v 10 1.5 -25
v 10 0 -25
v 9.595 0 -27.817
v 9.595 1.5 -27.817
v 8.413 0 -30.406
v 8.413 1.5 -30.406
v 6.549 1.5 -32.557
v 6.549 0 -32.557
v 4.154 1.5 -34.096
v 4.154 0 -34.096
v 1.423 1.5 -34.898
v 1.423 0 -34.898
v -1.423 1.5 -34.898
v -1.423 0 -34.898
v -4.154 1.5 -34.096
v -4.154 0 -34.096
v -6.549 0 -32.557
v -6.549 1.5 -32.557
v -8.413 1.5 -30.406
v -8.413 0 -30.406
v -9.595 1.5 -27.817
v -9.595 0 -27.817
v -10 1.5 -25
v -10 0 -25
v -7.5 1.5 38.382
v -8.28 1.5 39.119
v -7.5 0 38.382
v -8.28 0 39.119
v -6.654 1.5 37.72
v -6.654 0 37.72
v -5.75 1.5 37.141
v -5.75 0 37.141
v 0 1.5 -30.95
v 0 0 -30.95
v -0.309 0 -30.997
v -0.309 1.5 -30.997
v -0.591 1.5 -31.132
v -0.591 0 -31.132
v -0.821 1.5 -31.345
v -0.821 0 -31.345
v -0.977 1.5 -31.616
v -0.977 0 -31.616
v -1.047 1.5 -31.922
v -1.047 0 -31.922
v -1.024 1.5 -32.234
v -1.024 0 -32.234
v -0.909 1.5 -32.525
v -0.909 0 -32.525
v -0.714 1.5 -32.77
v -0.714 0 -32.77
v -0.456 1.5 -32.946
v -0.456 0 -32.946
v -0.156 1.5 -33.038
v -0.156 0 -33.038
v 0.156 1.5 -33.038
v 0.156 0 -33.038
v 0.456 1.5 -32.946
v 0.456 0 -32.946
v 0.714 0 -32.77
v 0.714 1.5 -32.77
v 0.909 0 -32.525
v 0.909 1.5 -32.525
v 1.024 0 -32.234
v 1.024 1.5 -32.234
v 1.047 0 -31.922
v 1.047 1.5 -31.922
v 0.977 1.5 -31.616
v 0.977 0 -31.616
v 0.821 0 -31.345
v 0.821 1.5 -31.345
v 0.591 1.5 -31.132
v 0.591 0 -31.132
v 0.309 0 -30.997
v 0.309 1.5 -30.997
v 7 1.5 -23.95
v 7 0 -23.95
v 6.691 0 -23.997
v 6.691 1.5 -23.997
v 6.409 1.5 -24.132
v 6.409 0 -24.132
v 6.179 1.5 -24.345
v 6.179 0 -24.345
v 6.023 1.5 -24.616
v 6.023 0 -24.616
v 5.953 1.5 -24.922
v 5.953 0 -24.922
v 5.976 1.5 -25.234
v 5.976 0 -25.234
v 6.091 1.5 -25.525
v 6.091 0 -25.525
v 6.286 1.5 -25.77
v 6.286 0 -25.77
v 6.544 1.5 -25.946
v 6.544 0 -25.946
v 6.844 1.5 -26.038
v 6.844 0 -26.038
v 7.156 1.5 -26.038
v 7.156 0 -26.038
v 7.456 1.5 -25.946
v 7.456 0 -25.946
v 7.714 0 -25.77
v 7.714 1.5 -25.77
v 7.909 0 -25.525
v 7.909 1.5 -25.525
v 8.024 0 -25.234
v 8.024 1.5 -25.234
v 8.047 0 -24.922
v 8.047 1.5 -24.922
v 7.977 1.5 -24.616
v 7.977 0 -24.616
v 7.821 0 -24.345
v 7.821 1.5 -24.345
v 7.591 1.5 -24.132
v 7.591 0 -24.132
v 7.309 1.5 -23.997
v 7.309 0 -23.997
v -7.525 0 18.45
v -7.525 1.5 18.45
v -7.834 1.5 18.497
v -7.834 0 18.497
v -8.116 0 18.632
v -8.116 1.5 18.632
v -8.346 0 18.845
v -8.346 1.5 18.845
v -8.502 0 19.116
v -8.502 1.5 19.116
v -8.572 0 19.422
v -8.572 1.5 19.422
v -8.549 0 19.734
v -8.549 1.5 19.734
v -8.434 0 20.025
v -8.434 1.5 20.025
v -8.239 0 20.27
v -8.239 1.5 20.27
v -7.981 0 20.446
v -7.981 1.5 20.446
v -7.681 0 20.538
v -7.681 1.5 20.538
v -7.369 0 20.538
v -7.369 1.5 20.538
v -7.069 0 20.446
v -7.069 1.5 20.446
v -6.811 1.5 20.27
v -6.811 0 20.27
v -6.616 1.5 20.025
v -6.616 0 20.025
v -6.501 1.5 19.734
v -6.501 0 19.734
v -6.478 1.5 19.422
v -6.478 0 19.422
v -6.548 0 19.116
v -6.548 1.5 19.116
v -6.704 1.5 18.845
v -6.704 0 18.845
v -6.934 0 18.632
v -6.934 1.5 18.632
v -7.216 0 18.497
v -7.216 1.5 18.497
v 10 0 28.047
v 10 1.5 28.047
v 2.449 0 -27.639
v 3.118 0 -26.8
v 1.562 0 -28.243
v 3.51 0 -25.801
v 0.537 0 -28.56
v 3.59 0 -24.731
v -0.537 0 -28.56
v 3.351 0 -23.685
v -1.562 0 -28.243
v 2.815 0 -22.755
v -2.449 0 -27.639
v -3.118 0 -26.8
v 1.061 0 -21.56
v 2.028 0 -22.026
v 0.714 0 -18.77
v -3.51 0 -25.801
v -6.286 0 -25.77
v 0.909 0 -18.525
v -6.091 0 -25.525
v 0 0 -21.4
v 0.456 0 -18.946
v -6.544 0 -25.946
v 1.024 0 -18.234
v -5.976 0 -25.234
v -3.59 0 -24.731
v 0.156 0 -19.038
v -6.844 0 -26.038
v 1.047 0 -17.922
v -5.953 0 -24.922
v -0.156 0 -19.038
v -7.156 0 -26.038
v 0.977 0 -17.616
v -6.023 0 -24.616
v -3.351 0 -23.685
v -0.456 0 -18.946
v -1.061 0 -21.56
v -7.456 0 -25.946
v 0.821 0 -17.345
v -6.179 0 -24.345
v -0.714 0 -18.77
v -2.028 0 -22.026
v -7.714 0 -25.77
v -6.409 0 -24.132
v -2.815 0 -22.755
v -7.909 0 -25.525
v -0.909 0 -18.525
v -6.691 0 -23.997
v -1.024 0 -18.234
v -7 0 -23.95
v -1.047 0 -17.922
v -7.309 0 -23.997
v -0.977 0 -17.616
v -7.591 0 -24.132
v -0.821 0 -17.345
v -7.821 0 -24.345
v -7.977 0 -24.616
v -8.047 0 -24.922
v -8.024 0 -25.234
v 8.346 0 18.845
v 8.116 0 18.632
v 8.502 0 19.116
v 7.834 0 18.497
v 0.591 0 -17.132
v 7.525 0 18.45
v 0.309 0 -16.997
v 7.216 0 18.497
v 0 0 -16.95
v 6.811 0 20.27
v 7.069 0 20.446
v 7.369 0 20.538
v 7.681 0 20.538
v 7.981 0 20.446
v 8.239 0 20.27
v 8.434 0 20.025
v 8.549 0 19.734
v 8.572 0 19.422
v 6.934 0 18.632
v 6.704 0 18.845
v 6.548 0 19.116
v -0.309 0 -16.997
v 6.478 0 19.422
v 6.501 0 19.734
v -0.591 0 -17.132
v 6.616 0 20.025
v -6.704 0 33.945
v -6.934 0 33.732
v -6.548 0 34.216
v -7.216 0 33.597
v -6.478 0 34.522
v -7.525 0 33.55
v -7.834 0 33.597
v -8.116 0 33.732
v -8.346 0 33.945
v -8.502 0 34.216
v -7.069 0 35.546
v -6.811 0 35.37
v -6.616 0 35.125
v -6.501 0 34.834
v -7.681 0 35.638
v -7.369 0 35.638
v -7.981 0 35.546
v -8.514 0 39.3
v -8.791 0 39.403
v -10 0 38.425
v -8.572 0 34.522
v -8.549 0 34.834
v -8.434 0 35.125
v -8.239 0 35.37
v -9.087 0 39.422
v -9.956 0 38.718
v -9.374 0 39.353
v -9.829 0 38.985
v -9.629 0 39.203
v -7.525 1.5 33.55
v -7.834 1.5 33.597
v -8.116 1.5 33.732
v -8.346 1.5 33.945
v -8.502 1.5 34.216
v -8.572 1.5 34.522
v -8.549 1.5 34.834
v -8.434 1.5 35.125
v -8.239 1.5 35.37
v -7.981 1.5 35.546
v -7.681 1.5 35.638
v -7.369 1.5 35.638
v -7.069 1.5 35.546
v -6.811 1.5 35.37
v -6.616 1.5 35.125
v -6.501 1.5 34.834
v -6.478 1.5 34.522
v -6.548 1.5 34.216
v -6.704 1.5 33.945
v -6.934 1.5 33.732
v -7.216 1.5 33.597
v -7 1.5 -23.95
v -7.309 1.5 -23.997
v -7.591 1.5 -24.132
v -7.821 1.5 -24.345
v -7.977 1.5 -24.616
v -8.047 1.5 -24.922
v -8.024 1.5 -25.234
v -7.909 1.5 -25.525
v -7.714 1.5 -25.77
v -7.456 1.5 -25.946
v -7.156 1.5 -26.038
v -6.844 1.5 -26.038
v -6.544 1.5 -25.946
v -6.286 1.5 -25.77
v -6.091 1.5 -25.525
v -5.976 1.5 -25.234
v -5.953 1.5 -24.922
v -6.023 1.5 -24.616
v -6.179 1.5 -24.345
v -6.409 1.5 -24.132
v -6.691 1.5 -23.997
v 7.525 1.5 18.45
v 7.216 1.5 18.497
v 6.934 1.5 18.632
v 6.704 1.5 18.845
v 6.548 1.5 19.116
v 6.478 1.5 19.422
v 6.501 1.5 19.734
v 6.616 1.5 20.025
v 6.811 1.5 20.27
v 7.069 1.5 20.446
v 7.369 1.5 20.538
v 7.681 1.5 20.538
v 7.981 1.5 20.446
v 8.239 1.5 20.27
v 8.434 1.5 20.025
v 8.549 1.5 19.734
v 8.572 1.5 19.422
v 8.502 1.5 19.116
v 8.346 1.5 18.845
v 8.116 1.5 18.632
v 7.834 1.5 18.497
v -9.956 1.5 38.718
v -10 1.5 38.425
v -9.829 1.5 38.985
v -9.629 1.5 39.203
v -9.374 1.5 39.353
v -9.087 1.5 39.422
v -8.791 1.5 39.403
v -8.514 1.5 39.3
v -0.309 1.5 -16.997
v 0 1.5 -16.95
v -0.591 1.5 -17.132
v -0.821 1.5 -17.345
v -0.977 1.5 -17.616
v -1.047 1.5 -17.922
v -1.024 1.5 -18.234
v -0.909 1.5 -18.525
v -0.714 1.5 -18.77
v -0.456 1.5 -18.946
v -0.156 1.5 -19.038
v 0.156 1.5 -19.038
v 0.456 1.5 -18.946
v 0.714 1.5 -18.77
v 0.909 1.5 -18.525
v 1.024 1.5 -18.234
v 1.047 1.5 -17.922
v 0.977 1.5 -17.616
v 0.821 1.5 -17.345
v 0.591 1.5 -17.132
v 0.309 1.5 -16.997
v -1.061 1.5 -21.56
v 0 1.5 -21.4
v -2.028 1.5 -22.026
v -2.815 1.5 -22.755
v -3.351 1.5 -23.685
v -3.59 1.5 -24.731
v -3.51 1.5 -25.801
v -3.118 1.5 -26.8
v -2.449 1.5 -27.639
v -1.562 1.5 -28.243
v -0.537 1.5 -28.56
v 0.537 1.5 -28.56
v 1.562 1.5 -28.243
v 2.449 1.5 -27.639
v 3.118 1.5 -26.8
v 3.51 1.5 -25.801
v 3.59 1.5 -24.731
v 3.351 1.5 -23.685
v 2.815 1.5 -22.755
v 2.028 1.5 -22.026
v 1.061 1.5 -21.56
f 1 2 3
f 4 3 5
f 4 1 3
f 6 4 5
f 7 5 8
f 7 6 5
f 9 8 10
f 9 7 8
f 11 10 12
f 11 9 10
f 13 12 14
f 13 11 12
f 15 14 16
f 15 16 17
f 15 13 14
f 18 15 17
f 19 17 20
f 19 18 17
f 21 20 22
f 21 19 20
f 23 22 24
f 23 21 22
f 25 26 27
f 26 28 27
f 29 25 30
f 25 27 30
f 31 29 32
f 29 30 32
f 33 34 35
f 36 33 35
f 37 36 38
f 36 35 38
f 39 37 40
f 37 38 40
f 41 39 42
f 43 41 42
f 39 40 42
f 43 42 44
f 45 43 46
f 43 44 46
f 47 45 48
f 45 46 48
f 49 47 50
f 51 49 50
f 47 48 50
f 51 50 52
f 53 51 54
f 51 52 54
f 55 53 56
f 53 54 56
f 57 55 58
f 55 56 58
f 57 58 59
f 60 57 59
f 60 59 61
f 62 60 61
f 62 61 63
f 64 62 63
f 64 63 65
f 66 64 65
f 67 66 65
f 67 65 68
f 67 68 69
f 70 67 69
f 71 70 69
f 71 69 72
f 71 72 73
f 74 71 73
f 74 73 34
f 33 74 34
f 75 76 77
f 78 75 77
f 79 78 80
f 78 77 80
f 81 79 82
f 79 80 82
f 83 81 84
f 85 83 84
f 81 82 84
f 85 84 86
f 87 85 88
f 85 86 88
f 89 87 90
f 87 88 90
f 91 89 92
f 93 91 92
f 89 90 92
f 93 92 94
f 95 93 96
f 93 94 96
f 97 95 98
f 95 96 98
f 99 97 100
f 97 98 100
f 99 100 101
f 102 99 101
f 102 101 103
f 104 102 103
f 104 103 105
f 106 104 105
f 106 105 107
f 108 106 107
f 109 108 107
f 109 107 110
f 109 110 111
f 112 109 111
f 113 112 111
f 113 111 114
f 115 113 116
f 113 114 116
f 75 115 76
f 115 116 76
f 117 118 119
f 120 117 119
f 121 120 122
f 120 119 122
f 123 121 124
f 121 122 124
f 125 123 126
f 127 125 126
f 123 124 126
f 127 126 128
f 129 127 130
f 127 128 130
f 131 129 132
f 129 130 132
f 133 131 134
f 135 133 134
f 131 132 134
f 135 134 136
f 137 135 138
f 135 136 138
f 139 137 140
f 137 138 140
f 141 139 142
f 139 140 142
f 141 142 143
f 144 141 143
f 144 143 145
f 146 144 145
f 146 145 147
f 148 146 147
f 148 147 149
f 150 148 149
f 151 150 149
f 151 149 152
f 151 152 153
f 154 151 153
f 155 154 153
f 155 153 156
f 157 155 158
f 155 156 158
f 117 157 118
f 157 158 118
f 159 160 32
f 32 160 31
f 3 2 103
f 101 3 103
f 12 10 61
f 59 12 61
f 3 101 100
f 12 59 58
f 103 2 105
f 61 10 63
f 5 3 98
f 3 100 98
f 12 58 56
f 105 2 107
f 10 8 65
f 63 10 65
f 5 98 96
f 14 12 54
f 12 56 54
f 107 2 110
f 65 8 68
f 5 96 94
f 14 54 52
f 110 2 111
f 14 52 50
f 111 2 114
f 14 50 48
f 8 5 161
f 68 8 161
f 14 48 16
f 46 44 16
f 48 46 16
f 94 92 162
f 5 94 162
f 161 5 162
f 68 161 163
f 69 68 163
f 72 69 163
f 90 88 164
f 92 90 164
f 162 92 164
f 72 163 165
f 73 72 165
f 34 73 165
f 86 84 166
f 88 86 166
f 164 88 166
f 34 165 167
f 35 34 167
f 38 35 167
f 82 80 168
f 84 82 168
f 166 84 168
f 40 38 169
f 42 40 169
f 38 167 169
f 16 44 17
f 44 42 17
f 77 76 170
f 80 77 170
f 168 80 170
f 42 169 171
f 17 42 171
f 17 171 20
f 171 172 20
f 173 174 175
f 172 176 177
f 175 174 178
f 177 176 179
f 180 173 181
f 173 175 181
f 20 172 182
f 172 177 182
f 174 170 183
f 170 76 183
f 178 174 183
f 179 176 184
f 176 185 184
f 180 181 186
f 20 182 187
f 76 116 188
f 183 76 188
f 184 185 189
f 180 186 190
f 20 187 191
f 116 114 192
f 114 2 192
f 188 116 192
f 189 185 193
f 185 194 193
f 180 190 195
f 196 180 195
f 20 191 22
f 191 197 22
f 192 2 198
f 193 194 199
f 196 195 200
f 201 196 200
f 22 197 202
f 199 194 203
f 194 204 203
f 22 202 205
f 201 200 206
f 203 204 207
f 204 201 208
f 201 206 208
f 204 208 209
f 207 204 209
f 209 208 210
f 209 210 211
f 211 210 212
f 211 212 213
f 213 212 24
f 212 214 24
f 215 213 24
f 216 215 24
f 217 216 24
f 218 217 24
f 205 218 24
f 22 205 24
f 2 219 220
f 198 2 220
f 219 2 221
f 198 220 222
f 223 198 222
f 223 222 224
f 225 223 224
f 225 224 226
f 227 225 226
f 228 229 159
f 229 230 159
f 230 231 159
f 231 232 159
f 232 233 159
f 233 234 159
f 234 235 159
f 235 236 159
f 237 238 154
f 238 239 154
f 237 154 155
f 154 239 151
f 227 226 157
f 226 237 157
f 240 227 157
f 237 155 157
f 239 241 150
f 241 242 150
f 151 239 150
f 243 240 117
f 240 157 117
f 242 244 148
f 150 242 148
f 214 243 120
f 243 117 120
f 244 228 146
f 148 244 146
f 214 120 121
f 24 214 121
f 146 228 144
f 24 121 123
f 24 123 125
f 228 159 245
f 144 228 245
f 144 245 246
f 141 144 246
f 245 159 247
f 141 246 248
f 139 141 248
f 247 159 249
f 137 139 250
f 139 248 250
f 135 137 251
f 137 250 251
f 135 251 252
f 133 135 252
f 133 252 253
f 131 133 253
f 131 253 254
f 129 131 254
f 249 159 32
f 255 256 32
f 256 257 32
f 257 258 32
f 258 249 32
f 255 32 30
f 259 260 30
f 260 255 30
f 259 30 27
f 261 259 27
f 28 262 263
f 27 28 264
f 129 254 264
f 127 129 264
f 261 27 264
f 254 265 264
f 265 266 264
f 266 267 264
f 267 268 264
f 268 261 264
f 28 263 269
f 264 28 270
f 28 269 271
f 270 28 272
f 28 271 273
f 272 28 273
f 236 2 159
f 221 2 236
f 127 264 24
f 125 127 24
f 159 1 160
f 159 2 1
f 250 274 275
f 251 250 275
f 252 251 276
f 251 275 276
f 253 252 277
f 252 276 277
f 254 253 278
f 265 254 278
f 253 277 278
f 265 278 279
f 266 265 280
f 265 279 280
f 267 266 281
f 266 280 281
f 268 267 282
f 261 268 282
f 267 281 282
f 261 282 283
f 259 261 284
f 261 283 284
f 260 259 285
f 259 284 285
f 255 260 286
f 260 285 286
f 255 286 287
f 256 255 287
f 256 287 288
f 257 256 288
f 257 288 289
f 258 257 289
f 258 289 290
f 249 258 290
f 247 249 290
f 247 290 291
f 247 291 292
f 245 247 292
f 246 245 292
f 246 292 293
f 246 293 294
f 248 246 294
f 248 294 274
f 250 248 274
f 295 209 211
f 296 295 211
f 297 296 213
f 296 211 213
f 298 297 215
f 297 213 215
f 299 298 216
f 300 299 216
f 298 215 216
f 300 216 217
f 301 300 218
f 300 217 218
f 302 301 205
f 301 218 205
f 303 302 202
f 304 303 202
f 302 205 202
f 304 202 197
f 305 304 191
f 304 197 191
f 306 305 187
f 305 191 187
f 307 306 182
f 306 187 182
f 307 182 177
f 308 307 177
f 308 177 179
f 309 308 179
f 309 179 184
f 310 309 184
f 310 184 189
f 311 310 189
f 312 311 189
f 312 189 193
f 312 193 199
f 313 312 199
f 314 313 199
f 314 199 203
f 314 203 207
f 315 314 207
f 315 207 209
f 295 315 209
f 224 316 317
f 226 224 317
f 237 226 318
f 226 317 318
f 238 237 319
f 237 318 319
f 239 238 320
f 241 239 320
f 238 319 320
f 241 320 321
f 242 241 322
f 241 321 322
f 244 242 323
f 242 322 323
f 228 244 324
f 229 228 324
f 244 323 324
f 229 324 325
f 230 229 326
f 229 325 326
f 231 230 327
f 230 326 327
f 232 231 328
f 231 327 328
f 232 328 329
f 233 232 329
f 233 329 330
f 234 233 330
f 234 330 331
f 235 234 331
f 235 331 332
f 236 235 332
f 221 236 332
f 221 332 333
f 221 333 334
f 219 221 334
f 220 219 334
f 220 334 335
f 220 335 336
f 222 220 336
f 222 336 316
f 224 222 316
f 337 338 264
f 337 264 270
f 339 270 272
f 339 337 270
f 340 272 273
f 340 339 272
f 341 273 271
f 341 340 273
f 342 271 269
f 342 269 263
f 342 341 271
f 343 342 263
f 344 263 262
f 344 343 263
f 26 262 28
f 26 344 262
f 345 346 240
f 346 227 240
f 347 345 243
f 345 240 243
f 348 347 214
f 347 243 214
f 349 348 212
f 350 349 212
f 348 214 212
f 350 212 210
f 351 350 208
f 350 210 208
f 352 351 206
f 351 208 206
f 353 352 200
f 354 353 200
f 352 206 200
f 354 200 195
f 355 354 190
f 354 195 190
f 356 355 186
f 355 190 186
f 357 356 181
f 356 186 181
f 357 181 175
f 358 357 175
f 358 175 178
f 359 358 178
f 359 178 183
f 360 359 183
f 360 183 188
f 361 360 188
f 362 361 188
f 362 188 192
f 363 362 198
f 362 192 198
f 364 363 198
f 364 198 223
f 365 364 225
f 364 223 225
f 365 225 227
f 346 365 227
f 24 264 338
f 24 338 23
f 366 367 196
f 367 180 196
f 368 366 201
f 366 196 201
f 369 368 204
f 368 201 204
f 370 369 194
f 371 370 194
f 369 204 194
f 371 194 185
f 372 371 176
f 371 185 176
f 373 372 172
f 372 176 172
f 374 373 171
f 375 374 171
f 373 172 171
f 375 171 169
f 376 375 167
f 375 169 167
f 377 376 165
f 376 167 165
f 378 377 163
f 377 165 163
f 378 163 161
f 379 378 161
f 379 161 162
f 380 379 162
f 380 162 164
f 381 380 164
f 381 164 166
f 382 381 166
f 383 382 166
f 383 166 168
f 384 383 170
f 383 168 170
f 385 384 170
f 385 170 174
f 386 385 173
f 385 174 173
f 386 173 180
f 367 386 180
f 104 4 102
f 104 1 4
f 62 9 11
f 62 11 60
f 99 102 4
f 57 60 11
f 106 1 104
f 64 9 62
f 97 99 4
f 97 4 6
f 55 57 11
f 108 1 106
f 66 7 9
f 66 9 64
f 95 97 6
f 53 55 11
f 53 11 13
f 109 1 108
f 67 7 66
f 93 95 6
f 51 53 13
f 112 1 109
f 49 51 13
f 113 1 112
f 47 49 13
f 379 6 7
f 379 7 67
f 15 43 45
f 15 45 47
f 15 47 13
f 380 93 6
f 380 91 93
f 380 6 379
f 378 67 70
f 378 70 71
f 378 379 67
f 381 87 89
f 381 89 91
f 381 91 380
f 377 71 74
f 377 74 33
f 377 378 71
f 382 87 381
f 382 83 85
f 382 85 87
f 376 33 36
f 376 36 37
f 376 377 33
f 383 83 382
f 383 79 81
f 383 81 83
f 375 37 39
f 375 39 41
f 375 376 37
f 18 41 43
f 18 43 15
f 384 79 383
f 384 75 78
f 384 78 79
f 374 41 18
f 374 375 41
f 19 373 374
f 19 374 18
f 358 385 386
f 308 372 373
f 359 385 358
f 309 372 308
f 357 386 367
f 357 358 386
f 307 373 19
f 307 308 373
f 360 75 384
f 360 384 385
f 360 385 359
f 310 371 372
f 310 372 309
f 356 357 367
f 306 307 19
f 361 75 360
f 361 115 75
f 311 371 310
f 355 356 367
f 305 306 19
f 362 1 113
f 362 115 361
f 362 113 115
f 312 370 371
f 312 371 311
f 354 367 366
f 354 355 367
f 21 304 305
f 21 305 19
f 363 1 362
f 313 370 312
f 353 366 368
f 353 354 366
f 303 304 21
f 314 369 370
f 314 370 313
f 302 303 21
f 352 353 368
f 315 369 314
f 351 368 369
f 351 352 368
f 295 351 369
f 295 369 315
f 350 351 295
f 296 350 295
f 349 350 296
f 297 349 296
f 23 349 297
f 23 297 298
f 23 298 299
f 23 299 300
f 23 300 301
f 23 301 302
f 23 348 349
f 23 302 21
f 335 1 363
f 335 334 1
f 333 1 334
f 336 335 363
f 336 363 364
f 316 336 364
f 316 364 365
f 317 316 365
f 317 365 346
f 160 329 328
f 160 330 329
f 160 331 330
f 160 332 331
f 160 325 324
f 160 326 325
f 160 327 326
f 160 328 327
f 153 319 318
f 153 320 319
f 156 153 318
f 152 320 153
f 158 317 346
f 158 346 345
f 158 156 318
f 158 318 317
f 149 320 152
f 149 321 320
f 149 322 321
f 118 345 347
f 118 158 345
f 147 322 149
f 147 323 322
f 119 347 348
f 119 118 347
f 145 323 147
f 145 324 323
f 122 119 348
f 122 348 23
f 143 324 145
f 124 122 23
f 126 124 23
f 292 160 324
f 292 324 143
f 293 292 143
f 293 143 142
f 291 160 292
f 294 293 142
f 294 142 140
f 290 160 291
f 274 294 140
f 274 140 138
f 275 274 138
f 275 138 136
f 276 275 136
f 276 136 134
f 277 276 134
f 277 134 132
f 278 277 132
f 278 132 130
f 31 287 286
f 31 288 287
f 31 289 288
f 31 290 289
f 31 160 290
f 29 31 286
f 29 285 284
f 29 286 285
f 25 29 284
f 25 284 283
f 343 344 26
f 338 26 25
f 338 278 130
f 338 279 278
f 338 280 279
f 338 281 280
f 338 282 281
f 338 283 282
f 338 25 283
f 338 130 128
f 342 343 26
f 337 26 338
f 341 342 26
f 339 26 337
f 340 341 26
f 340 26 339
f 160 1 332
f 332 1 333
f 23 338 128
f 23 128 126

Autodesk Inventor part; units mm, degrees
ref_plane "YZ Plane" through (0, 0, 0) normal (1, 0, 0) x (0, 1, 0)
ref_plane "XZ Plane" through (0, 0, 0) normal (0, 1, 0) x (-1, 0, 0)
ref_plane "XY Plane" through (0, 0, 0) normal (0, 0, 1) x (1, 0, 0)
sketch "Sketch1" plane through (0, 0, 0) normal (0, 1, 0) x (-1, 0, 0)
  line L0 (10, -35) -> (-10, -35)
  line L1 (-10, -35) -> (-10, 41.4211)
  line L2 (10, 41.4211) -> (10, -35)
  arc A0 (-10, 41.4211) -> (10, 41.4211) centre (0, 47.1) ccw
  point P0 (0, 0)
  dimension "d2" = 35
  dimension "d3" = 10
  dimension "d36" = 23
  dimension "d37" = 82.1
  dimension "d39" = 76.4211
  dimension "d40" = 20
extrude "Plate1" add sketch "Sketch1" along normal blind 1.5
sketch "Sketch3" plane through (0, 1.5, 0) normal (0, 1, 0) x (1, 0, 0)
  circle A0 centre (0, 25) radius 10
  circle A1 centre (0, -25) radius 10
  line L0 (-10, 35) -> (10, 35) projected
  line L1 (10, -44) -> (-10, -44) projected
  line L2 (-10, 35) -> (10, 35)
  line L3 (10, 35) -> (10, 25)
  line L4 (10, 25) -> (-10, 25)
  line L5 (-10, 25) -> (-10, 35)
  line L6 (10, -35) -> (-10, -35)
  line L7 (-10, -35) -> (-10, -25)
  line L8 (-10, -25) -> (10, -25)
  line L9 (10, -25) -> (10, -44)
  point P0 (0, 0)
  point P1 (-10, -41.4211)
  point P2 (10, -25)
  point P3 (0, -35)
  point P4 (-10, -35)
  point P5 (0, 35)
  point P6 (10, 35)
  dimension "d12" = 20
  dimension "d13" = 20
  dimension "d14" = 10
  dimension "d15" = 10
  dimension "d16" = 25
  dimension "d17" = 25
  dimension "d18" = 10
extrude "Extrusion1" cut sketch "Sketch3" against normal blind 10 contours L5 L0 A0 | A0 L0 L3
sketch "Sketch4" plane through (0, 1.5, 0) normal (0, 1, 0) x (1, 0, 0)
  circle A0 centre (-7, 25) radius 0.8
  arc A1 (10, 25) -> (-10, 25) centre (0, 25) ccw projected
  circle A2 centre (0, 18) radius 0.8
  circle A3 centre (7, 25) radius 0.8
  circle A4 centre (0, 32) radius 0.8
  point P0 (0, 0)
  dimension "d21" = 0
  dimension "d22" = 7
  dimension "d23" = 1.6
  dimension "d26" = 360
hole "Hole2" at (0, 1.5, -32) at (7, 1.5, -25) at (0, 1.5, -18) at (-7, 1.5, -25) direction (0, -1, 0) diameter 2.1 depth 1.5
fillet "Fillet1" radius 1 2 edges at (-10, 0.75, 41.4211) (10, 0.75, 41.4211)
sketch "Sketch5" plane through (0, 1.5, 0) normal (0, 1, 0) x (1, 0, 0)
  arc A0 (10, 25) -> (-10, 25) centre (0, 25) ccw projected
  point P0 (0, 0)
hole "Hole3" at (0, 1.5, -25) direction (0, -1, 0) diameter 7.2 depth 1.5
sketch "Sketch8" plane through (0, 1.5, 0) normal (0, 1, 0) x (1, 0, 0)
  line L0 (19.8447, -22.3636) -> (-14.9774, -42.4682)
  arc A0 (8.28, -39.1193) -> (-8.28, -39.1193) centre (0, -47.1) ccw projected
  arc A1 (8.28, -39.1193) -> (10, -38.4253) centre (9, -38.4253) ccw projected
  line L1 (10, 25) -> (10, -38.4253) projected
  point P0 (0, 0)
  point P1 (10, -28.0474)
  point P2 (-5.75, -37.1407)
  dimension "d63" = 60
extrude "Extrusion2" cut sketch "Sketch8" against normal blind 1.5
sketch "Sketch9" plane through (0, 0, 0) normal (0, -1, 0) x (1, 0, 0)
  circle A0 centre (-7.525, 34.6) radius 1.05
  circle A1 centre (7.525, 19.5) radius 1.05
  circle A2 centre (7.525, 19.5) radius 1.05
  line L0 (-10, -25) -> (-10, 38.4253) projected
  circle A3 centre (-7.525, 19.5) radius 1.05
  point P0 (0, 0)
hole "Hole6" at (-7.525, 0, 19.5) at (7.525, 0, 19.5) at (-7.525, 0, 34.6) direction (0, 1, 0) diameter 2.1 end through all
equation "\"d33\" = Thickness"
equation "\"d47\" = Thickness"
equation "\"d71\" = Thickness"
equation "\"d4\" = Thickness"
equation "\"BendReliefWidth\" = Thickness"
equation "\"BendReliefDepth\" = 0.5 * Thickness"
equation "\"CornerReliefSize\" = 4 * Thickness"
equation "\"MinimumRemnant\" = 2 * Thickness"
equation "\"TransitionRadius\" = BendRadius"
equation "\"JacobiRadiusSize\" = BendRadius"
equation "\"GapSize\" = Thickness"
equation "\"Thickness\" = 1.5"
equation "\"BendRadius\" = 0.31"
properties part number "axis_8_10_connector_frame" material "Aluminum 6061-AHC"
